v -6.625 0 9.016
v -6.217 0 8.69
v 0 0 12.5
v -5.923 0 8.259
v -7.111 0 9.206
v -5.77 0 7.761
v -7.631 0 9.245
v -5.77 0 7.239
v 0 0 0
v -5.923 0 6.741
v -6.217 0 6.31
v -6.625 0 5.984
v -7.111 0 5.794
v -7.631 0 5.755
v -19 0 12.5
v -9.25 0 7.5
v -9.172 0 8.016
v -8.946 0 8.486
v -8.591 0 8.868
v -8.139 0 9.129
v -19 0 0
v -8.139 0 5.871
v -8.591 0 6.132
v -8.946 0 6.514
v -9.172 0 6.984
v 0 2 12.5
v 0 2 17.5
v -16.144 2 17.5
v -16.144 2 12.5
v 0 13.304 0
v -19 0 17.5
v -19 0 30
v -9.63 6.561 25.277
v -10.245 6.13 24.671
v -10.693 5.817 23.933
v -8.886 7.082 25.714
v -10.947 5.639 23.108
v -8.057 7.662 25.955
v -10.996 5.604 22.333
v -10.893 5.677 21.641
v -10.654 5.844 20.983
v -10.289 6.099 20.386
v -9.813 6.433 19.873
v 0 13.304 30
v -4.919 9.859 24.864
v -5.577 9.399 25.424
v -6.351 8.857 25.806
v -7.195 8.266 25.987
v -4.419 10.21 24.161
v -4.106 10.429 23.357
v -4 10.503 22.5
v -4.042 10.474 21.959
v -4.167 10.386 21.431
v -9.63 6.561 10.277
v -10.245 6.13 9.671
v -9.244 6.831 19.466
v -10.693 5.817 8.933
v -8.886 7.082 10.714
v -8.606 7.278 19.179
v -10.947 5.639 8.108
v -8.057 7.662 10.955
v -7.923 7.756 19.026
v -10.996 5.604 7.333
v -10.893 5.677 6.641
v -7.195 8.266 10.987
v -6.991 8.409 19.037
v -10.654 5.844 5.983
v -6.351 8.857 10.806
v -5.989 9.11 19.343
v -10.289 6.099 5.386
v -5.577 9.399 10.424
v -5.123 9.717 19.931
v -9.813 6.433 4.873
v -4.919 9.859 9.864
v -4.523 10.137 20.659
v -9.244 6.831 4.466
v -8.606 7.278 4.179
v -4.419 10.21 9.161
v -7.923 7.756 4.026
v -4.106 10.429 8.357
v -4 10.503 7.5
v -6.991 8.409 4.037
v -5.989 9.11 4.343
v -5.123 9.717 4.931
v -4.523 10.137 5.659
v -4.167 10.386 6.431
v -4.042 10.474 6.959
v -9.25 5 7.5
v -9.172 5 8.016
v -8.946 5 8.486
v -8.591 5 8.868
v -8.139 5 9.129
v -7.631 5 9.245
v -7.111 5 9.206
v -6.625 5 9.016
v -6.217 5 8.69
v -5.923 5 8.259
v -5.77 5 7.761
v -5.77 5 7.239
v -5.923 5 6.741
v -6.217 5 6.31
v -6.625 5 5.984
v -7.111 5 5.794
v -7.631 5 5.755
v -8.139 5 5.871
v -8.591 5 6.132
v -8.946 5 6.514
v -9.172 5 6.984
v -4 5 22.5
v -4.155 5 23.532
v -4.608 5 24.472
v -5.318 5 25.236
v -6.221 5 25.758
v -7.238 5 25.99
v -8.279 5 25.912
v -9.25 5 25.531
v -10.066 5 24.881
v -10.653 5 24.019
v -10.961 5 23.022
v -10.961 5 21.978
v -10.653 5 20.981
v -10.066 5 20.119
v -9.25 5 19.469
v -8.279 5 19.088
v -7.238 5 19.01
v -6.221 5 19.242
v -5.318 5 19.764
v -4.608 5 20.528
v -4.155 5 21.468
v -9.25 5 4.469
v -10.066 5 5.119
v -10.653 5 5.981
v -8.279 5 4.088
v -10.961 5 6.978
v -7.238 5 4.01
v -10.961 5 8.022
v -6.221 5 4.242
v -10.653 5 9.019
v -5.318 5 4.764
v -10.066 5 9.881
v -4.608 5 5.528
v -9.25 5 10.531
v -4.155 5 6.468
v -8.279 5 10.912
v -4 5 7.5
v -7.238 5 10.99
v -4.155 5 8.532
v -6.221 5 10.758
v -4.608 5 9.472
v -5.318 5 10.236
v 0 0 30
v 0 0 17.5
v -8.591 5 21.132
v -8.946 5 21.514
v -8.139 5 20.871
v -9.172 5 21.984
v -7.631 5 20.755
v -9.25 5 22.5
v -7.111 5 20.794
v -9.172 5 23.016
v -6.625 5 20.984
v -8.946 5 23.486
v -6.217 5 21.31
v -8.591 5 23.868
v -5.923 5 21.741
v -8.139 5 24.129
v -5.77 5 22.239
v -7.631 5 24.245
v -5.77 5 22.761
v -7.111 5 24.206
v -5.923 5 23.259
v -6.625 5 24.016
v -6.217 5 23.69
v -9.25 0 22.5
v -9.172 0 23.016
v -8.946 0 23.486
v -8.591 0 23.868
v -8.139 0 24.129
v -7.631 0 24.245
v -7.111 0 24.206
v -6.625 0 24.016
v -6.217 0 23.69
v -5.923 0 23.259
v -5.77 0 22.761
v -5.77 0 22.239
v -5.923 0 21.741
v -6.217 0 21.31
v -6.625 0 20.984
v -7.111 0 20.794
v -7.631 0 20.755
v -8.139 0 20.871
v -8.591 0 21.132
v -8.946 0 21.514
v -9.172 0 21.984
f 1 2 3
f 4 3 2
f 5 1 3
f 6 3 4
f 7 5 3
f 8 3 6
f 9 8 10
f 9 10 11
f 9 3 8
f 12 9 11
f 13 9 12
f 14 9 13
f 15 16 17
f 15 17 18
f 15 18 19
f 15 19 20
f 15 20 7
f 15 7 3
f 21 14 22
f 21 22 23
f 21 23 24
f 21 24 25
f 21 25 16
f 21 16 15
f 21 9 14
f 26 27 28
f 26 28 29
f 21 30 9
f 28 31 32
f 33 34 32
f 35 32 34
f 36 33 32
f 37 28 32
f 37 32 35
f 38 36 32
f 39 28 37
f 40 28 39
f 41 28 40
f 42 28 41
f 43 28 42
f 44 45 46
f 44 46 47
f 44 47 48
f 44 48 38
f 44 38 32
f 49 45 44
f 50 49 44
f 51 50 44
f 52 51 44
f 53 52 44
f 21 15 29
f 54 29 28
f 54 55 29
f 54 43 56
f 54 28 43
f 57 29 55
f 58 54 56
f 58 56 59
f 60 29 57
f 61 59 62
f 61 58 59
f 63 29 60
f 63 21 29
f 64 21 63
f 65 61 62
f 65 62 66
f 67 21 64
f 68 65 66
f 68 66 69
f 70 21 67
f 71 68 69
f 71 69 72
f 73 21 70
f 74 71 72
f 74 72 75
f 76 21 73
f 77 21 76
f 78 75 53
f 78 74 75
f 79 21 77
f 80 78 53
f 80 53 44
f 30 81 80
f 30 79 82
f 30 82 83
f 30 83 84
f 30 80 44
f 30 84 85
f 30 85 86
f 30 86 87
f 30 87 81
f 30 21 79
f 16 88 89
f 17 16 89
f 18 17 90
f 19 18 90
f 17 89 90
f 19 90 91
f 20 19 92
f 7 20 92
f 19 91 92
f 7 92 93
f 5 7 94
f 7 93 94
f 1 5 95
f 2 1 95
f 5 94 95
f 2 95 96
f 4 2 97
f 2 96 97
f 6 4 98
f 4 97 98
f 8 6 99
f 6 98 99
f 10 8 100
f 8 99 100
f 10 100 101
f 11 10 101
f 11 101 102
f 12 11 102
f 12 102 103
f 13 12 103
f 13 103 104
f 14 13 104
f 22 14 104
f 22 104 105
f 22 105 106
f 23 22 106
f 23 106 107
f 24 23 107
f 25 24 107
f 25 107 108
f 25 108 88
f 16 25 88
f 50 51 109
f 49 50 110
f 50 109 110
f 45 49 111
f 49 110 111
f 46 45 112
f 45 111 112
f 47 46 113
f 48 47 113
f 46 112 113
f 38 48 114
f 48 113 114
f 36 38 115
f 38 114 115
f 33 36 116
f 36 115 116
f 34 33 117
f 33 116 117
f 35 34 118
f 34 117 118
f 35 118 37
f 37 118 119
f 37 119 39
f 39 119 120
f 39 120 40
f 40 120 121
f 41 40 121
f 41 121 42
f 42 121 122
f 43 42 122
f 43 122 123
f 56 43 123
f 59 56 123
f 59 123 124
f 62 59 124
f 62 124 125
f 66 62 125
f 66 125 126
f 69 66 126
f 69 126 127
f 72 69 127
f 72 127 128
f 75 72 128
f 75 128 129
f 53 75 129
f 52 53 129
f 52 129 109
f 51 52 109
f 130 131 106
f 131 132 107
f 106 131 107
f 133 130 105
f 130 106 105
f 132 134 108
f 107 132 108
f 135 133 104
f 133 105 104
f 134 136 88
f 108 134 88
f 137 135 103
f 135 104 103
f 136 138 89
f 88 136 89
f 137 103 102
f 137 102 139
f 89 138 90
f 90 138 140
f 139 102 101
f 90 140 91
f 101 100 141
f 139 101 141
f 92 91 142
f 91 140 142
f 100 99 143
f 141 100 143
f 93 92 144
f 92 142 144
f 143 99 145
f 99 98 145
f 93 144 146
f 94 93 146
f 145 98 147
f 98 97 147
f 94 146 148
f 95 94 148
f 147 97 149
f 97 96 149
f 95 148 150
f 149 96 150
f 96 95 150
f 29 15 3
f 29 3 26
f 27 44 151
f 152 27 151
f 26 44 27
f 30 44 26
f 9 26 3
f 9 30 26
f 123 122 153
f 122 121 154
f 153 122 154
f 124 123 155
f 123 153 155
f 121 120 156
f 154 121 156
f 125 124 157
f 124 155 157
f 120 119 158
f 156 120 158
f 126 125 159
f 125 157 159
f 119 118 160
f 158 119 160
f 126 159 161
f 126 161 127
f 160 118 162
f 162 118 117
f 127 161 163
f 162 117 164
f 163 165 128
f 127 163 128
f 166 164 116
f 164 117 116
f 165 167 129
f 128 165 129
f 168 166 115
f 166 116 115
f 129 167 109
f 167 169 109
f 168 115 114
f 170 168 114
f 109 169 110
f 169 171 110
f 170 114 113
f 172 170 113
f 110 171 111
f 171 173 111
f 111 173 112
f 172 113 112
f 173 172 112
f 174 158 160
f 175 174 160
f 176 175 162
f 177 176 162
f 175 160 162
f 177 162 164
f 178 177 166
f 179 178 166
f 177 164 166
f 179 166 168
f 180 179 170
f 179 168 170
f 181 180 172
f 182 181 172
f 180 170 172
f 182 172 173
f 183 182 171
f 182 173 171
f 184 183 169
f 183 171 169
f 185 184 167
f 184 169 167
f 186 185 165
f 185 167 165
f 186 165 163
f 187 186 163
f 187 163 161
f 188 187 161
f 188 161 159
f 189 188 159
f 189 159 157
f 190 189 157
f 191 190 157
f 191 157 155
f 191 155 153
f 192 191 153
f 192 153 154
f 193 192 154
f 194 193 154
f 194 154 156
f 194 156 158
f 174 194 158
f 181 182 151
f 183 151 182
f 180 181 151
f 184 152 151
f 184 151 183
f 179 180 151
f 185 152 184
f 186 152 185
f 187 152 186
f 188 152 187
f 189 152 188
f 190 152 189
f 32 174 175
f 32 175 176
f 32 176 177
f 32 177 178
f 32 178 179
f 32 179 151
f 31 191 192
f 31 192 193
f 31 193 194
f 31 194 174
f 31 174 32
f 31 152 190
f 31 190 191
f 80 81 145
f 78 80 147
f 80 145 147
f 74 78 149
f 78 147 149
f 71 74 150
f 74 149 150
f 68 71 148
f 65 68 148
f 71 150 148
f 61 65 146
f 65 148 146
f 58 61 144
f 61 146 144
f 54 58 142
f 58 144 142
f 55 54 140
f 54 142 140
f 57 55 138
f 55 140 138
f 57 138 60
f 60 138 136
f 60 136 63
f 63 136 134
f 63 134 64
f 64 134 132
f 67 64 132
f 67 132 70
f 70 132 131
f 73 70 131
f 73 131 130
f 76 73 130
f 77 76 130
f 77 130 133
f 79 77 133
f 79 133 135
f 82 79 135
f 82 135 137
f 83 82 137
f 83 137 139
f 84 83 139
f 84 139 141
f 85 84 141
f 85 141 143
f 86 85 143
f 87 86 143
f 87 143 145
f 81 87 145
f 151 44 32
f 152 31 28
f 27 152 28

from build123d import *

# Parameters (mm, degrees)
BOSS_EXTRU_1_DEPTH      = 30
ENL_V_MAT_EXTRU_1_REACH = 38.469
ESQUISSE2_R             = 3.5
ENL_V_MAT_EXTRU_2_REACH = 38.469
ESQUISSE3_R             = 1.75
ENL_V_MAT_EXTRU_3_REACH = 39.921
ESQUISSE4_W             = 5
ESQUISSE4_H             = 2


with BuildPart() as part:
    # Esquisse1 → Boss.-Extru.1 (new body)
    with BuildSketch(Plane.XY):
        Polygon((0, 0), (-19, 0), (0, 13.303943226), align=None)
    extrude(amount=BOSS_EXTRU_1_DEPTH)

    # Enlèv. mat.-Extru.1: up to this plane
    enl_v_mat_extru_1_end = Plane(origin=(-19, 0, 30), z_dir=(0.5735764363510416, -0.8191520442889949, 0))
    # Esquisse2 → Enlèv. mat.-Extru.1 (cut, up to the surface)
    with BuildSketch(Plane(origin=(0, 5, 0), x_dir=(-1, 0, 0), z_dir=(0, -1, 0)), mode=Mode.PRIVATE) as enl_v_mat_extru_1_sk1:
        with Locations(Location((7.5, -7.5, 0), (0, 0, 180))):
            Circle(ESQUISSE2_R)
    enl_v_mat_extru_1_tool1 = split(extrude(enl_v_mat_extru_1_sk1.sketch, amount=-ENL_V_MAT_EXTRU_1_REACH, mode=Mode.PRIVATE), bisect_by=enl_v_mat_extru_1_end, keep=Keep.BOTH, mode=Mode.PRIVATE)
    add(enl_v_mat_extru_1_tool1.solids().sort_by_distance((-7.5, 5, 7.5))[0], mode=Mode.SUBTRACT)
    # Esquisse2 → Enlèv. mat.-Extru.1 (cut, up to the surface)
    with BuildSketch(Plane(origin=(0, 5, 0), x_dir=(-1, 0, 0), z_dir=(0, -1, 0)), mode=Mode.PRIVATE) as enl_v_mat_extru_1_sk2:
        with Locations(Location((7.5, -22.5, 0), (0, 0, 180))):
            Circle(ESQUISSE2_R)
    enl_v_mat_extru_1_tool2 = split(extrude(enl_v_mat_extru_1_sk2.sketch, amount=-ENL_V_MAT_EXTRU_1_REACH, mode=Mode.PRIVATE), bisect_by=enl_v_mat_extru_1_end, keep=Keep.BOTH, mode=Mode.PRIVATE)
    add(enl_v_mat_extru_1_tool2.solids().sort_by_distance((-7.5, 5, 22.5))[0], mode=Mode.SUBTRACT)

    # Esquisse3 → Enlèv. mat.-Extru.2 (cut, up to next)
    with BuildSketch(Plane(origin=(0, 5, 0), x_dir=(1, 0, 0), z_dir=(0, 1, 0)), mode=Mode.PRIVATE) as enl_v_mat_extru_2_sk1:
        with Locations(Location((-7.5, -22.5, 0), (0, 0, 180))):
            Circle(ESQUISSE3_R)
    enl_v_mat_extru_2_tool1 = extrude(enl_v_mat_extru_2_sk1.sketch, amount=-ENL_V_MAT_EXTRU_2_REACH, mode=Mode.PRIVATE) & part.part
    # Esquisse3 → Enlèv. mat.-Extru.2 (cut, up to next)
    with BuildSketch(Plane(origin=(0, 5, 0), x_dir=(1, 0, 0), z_dir=(0, 1, 0)), mode=Mode.PRIVATE) as enl_v_mat_extru_2_sk2:
        with Locations(Location((-7.5, -7.5, 0), (0, 0, 180))):
            Circle(ESQUISSE3_R)
    enl_v_mat_extru_2_tool2 = extrude(enl_v_mat_extru_2_sk2.sketch, amount=-ENL_V_MAT_EXTRU_2_REACH, mode=Mode.PRIVATE) & part.part
    add(enl_v_mat_extru_2_tool1.solids().sort_by_distance((-7.5, 5, 22.5))[0], mode=Mode.SUBTRACT)
    add(enl_v_mat_extru_2_tool2.solids().sort_by_distance((-7.5, 5, 7.5))[0], mode=Mode.SUBTRACT)

    # Enlèv. mat.-Extru.3: up to this plane
    enl_v_mat_extru_3_end = Plane(origin=(-19, 0, 30), z_dir=(0.5735764363510416, -0.8191520442889949, 0))
    # Esquisse4 → Enlèv. mat.-Extru.3 (cut, up to the surface)
    with BuildSketch(Plane(origin=(0, 0, 0), x_dir=(0, 0, -1), z_dir=(1, 0, 0)), mode=Mode.PRIVATE) as enl_v_mat_extru_3_sk1:
        with Locations((-15, 1)):
            Rectangle(ESQUISSE4_W, ESQUISSE4_H)
    enl_v_mat_extru_3_tool1 = split(extrude(enl_v_mat_extru_3_sk1.sketch, amount=-ENL_V_MAT_EXTRU_3_REACH, mode=Mode.PRIVATE), bisect_by=enl_v_mat_extru_3_end, keep=Keep.BOTH, mode=Mode.PRIVATE)
    add(enl_v_mat_extru_3_tool1.solids().sort_by_distance((0, 1, 15))[0], mode=Mode.SUBTRACT)


solid = part.part
